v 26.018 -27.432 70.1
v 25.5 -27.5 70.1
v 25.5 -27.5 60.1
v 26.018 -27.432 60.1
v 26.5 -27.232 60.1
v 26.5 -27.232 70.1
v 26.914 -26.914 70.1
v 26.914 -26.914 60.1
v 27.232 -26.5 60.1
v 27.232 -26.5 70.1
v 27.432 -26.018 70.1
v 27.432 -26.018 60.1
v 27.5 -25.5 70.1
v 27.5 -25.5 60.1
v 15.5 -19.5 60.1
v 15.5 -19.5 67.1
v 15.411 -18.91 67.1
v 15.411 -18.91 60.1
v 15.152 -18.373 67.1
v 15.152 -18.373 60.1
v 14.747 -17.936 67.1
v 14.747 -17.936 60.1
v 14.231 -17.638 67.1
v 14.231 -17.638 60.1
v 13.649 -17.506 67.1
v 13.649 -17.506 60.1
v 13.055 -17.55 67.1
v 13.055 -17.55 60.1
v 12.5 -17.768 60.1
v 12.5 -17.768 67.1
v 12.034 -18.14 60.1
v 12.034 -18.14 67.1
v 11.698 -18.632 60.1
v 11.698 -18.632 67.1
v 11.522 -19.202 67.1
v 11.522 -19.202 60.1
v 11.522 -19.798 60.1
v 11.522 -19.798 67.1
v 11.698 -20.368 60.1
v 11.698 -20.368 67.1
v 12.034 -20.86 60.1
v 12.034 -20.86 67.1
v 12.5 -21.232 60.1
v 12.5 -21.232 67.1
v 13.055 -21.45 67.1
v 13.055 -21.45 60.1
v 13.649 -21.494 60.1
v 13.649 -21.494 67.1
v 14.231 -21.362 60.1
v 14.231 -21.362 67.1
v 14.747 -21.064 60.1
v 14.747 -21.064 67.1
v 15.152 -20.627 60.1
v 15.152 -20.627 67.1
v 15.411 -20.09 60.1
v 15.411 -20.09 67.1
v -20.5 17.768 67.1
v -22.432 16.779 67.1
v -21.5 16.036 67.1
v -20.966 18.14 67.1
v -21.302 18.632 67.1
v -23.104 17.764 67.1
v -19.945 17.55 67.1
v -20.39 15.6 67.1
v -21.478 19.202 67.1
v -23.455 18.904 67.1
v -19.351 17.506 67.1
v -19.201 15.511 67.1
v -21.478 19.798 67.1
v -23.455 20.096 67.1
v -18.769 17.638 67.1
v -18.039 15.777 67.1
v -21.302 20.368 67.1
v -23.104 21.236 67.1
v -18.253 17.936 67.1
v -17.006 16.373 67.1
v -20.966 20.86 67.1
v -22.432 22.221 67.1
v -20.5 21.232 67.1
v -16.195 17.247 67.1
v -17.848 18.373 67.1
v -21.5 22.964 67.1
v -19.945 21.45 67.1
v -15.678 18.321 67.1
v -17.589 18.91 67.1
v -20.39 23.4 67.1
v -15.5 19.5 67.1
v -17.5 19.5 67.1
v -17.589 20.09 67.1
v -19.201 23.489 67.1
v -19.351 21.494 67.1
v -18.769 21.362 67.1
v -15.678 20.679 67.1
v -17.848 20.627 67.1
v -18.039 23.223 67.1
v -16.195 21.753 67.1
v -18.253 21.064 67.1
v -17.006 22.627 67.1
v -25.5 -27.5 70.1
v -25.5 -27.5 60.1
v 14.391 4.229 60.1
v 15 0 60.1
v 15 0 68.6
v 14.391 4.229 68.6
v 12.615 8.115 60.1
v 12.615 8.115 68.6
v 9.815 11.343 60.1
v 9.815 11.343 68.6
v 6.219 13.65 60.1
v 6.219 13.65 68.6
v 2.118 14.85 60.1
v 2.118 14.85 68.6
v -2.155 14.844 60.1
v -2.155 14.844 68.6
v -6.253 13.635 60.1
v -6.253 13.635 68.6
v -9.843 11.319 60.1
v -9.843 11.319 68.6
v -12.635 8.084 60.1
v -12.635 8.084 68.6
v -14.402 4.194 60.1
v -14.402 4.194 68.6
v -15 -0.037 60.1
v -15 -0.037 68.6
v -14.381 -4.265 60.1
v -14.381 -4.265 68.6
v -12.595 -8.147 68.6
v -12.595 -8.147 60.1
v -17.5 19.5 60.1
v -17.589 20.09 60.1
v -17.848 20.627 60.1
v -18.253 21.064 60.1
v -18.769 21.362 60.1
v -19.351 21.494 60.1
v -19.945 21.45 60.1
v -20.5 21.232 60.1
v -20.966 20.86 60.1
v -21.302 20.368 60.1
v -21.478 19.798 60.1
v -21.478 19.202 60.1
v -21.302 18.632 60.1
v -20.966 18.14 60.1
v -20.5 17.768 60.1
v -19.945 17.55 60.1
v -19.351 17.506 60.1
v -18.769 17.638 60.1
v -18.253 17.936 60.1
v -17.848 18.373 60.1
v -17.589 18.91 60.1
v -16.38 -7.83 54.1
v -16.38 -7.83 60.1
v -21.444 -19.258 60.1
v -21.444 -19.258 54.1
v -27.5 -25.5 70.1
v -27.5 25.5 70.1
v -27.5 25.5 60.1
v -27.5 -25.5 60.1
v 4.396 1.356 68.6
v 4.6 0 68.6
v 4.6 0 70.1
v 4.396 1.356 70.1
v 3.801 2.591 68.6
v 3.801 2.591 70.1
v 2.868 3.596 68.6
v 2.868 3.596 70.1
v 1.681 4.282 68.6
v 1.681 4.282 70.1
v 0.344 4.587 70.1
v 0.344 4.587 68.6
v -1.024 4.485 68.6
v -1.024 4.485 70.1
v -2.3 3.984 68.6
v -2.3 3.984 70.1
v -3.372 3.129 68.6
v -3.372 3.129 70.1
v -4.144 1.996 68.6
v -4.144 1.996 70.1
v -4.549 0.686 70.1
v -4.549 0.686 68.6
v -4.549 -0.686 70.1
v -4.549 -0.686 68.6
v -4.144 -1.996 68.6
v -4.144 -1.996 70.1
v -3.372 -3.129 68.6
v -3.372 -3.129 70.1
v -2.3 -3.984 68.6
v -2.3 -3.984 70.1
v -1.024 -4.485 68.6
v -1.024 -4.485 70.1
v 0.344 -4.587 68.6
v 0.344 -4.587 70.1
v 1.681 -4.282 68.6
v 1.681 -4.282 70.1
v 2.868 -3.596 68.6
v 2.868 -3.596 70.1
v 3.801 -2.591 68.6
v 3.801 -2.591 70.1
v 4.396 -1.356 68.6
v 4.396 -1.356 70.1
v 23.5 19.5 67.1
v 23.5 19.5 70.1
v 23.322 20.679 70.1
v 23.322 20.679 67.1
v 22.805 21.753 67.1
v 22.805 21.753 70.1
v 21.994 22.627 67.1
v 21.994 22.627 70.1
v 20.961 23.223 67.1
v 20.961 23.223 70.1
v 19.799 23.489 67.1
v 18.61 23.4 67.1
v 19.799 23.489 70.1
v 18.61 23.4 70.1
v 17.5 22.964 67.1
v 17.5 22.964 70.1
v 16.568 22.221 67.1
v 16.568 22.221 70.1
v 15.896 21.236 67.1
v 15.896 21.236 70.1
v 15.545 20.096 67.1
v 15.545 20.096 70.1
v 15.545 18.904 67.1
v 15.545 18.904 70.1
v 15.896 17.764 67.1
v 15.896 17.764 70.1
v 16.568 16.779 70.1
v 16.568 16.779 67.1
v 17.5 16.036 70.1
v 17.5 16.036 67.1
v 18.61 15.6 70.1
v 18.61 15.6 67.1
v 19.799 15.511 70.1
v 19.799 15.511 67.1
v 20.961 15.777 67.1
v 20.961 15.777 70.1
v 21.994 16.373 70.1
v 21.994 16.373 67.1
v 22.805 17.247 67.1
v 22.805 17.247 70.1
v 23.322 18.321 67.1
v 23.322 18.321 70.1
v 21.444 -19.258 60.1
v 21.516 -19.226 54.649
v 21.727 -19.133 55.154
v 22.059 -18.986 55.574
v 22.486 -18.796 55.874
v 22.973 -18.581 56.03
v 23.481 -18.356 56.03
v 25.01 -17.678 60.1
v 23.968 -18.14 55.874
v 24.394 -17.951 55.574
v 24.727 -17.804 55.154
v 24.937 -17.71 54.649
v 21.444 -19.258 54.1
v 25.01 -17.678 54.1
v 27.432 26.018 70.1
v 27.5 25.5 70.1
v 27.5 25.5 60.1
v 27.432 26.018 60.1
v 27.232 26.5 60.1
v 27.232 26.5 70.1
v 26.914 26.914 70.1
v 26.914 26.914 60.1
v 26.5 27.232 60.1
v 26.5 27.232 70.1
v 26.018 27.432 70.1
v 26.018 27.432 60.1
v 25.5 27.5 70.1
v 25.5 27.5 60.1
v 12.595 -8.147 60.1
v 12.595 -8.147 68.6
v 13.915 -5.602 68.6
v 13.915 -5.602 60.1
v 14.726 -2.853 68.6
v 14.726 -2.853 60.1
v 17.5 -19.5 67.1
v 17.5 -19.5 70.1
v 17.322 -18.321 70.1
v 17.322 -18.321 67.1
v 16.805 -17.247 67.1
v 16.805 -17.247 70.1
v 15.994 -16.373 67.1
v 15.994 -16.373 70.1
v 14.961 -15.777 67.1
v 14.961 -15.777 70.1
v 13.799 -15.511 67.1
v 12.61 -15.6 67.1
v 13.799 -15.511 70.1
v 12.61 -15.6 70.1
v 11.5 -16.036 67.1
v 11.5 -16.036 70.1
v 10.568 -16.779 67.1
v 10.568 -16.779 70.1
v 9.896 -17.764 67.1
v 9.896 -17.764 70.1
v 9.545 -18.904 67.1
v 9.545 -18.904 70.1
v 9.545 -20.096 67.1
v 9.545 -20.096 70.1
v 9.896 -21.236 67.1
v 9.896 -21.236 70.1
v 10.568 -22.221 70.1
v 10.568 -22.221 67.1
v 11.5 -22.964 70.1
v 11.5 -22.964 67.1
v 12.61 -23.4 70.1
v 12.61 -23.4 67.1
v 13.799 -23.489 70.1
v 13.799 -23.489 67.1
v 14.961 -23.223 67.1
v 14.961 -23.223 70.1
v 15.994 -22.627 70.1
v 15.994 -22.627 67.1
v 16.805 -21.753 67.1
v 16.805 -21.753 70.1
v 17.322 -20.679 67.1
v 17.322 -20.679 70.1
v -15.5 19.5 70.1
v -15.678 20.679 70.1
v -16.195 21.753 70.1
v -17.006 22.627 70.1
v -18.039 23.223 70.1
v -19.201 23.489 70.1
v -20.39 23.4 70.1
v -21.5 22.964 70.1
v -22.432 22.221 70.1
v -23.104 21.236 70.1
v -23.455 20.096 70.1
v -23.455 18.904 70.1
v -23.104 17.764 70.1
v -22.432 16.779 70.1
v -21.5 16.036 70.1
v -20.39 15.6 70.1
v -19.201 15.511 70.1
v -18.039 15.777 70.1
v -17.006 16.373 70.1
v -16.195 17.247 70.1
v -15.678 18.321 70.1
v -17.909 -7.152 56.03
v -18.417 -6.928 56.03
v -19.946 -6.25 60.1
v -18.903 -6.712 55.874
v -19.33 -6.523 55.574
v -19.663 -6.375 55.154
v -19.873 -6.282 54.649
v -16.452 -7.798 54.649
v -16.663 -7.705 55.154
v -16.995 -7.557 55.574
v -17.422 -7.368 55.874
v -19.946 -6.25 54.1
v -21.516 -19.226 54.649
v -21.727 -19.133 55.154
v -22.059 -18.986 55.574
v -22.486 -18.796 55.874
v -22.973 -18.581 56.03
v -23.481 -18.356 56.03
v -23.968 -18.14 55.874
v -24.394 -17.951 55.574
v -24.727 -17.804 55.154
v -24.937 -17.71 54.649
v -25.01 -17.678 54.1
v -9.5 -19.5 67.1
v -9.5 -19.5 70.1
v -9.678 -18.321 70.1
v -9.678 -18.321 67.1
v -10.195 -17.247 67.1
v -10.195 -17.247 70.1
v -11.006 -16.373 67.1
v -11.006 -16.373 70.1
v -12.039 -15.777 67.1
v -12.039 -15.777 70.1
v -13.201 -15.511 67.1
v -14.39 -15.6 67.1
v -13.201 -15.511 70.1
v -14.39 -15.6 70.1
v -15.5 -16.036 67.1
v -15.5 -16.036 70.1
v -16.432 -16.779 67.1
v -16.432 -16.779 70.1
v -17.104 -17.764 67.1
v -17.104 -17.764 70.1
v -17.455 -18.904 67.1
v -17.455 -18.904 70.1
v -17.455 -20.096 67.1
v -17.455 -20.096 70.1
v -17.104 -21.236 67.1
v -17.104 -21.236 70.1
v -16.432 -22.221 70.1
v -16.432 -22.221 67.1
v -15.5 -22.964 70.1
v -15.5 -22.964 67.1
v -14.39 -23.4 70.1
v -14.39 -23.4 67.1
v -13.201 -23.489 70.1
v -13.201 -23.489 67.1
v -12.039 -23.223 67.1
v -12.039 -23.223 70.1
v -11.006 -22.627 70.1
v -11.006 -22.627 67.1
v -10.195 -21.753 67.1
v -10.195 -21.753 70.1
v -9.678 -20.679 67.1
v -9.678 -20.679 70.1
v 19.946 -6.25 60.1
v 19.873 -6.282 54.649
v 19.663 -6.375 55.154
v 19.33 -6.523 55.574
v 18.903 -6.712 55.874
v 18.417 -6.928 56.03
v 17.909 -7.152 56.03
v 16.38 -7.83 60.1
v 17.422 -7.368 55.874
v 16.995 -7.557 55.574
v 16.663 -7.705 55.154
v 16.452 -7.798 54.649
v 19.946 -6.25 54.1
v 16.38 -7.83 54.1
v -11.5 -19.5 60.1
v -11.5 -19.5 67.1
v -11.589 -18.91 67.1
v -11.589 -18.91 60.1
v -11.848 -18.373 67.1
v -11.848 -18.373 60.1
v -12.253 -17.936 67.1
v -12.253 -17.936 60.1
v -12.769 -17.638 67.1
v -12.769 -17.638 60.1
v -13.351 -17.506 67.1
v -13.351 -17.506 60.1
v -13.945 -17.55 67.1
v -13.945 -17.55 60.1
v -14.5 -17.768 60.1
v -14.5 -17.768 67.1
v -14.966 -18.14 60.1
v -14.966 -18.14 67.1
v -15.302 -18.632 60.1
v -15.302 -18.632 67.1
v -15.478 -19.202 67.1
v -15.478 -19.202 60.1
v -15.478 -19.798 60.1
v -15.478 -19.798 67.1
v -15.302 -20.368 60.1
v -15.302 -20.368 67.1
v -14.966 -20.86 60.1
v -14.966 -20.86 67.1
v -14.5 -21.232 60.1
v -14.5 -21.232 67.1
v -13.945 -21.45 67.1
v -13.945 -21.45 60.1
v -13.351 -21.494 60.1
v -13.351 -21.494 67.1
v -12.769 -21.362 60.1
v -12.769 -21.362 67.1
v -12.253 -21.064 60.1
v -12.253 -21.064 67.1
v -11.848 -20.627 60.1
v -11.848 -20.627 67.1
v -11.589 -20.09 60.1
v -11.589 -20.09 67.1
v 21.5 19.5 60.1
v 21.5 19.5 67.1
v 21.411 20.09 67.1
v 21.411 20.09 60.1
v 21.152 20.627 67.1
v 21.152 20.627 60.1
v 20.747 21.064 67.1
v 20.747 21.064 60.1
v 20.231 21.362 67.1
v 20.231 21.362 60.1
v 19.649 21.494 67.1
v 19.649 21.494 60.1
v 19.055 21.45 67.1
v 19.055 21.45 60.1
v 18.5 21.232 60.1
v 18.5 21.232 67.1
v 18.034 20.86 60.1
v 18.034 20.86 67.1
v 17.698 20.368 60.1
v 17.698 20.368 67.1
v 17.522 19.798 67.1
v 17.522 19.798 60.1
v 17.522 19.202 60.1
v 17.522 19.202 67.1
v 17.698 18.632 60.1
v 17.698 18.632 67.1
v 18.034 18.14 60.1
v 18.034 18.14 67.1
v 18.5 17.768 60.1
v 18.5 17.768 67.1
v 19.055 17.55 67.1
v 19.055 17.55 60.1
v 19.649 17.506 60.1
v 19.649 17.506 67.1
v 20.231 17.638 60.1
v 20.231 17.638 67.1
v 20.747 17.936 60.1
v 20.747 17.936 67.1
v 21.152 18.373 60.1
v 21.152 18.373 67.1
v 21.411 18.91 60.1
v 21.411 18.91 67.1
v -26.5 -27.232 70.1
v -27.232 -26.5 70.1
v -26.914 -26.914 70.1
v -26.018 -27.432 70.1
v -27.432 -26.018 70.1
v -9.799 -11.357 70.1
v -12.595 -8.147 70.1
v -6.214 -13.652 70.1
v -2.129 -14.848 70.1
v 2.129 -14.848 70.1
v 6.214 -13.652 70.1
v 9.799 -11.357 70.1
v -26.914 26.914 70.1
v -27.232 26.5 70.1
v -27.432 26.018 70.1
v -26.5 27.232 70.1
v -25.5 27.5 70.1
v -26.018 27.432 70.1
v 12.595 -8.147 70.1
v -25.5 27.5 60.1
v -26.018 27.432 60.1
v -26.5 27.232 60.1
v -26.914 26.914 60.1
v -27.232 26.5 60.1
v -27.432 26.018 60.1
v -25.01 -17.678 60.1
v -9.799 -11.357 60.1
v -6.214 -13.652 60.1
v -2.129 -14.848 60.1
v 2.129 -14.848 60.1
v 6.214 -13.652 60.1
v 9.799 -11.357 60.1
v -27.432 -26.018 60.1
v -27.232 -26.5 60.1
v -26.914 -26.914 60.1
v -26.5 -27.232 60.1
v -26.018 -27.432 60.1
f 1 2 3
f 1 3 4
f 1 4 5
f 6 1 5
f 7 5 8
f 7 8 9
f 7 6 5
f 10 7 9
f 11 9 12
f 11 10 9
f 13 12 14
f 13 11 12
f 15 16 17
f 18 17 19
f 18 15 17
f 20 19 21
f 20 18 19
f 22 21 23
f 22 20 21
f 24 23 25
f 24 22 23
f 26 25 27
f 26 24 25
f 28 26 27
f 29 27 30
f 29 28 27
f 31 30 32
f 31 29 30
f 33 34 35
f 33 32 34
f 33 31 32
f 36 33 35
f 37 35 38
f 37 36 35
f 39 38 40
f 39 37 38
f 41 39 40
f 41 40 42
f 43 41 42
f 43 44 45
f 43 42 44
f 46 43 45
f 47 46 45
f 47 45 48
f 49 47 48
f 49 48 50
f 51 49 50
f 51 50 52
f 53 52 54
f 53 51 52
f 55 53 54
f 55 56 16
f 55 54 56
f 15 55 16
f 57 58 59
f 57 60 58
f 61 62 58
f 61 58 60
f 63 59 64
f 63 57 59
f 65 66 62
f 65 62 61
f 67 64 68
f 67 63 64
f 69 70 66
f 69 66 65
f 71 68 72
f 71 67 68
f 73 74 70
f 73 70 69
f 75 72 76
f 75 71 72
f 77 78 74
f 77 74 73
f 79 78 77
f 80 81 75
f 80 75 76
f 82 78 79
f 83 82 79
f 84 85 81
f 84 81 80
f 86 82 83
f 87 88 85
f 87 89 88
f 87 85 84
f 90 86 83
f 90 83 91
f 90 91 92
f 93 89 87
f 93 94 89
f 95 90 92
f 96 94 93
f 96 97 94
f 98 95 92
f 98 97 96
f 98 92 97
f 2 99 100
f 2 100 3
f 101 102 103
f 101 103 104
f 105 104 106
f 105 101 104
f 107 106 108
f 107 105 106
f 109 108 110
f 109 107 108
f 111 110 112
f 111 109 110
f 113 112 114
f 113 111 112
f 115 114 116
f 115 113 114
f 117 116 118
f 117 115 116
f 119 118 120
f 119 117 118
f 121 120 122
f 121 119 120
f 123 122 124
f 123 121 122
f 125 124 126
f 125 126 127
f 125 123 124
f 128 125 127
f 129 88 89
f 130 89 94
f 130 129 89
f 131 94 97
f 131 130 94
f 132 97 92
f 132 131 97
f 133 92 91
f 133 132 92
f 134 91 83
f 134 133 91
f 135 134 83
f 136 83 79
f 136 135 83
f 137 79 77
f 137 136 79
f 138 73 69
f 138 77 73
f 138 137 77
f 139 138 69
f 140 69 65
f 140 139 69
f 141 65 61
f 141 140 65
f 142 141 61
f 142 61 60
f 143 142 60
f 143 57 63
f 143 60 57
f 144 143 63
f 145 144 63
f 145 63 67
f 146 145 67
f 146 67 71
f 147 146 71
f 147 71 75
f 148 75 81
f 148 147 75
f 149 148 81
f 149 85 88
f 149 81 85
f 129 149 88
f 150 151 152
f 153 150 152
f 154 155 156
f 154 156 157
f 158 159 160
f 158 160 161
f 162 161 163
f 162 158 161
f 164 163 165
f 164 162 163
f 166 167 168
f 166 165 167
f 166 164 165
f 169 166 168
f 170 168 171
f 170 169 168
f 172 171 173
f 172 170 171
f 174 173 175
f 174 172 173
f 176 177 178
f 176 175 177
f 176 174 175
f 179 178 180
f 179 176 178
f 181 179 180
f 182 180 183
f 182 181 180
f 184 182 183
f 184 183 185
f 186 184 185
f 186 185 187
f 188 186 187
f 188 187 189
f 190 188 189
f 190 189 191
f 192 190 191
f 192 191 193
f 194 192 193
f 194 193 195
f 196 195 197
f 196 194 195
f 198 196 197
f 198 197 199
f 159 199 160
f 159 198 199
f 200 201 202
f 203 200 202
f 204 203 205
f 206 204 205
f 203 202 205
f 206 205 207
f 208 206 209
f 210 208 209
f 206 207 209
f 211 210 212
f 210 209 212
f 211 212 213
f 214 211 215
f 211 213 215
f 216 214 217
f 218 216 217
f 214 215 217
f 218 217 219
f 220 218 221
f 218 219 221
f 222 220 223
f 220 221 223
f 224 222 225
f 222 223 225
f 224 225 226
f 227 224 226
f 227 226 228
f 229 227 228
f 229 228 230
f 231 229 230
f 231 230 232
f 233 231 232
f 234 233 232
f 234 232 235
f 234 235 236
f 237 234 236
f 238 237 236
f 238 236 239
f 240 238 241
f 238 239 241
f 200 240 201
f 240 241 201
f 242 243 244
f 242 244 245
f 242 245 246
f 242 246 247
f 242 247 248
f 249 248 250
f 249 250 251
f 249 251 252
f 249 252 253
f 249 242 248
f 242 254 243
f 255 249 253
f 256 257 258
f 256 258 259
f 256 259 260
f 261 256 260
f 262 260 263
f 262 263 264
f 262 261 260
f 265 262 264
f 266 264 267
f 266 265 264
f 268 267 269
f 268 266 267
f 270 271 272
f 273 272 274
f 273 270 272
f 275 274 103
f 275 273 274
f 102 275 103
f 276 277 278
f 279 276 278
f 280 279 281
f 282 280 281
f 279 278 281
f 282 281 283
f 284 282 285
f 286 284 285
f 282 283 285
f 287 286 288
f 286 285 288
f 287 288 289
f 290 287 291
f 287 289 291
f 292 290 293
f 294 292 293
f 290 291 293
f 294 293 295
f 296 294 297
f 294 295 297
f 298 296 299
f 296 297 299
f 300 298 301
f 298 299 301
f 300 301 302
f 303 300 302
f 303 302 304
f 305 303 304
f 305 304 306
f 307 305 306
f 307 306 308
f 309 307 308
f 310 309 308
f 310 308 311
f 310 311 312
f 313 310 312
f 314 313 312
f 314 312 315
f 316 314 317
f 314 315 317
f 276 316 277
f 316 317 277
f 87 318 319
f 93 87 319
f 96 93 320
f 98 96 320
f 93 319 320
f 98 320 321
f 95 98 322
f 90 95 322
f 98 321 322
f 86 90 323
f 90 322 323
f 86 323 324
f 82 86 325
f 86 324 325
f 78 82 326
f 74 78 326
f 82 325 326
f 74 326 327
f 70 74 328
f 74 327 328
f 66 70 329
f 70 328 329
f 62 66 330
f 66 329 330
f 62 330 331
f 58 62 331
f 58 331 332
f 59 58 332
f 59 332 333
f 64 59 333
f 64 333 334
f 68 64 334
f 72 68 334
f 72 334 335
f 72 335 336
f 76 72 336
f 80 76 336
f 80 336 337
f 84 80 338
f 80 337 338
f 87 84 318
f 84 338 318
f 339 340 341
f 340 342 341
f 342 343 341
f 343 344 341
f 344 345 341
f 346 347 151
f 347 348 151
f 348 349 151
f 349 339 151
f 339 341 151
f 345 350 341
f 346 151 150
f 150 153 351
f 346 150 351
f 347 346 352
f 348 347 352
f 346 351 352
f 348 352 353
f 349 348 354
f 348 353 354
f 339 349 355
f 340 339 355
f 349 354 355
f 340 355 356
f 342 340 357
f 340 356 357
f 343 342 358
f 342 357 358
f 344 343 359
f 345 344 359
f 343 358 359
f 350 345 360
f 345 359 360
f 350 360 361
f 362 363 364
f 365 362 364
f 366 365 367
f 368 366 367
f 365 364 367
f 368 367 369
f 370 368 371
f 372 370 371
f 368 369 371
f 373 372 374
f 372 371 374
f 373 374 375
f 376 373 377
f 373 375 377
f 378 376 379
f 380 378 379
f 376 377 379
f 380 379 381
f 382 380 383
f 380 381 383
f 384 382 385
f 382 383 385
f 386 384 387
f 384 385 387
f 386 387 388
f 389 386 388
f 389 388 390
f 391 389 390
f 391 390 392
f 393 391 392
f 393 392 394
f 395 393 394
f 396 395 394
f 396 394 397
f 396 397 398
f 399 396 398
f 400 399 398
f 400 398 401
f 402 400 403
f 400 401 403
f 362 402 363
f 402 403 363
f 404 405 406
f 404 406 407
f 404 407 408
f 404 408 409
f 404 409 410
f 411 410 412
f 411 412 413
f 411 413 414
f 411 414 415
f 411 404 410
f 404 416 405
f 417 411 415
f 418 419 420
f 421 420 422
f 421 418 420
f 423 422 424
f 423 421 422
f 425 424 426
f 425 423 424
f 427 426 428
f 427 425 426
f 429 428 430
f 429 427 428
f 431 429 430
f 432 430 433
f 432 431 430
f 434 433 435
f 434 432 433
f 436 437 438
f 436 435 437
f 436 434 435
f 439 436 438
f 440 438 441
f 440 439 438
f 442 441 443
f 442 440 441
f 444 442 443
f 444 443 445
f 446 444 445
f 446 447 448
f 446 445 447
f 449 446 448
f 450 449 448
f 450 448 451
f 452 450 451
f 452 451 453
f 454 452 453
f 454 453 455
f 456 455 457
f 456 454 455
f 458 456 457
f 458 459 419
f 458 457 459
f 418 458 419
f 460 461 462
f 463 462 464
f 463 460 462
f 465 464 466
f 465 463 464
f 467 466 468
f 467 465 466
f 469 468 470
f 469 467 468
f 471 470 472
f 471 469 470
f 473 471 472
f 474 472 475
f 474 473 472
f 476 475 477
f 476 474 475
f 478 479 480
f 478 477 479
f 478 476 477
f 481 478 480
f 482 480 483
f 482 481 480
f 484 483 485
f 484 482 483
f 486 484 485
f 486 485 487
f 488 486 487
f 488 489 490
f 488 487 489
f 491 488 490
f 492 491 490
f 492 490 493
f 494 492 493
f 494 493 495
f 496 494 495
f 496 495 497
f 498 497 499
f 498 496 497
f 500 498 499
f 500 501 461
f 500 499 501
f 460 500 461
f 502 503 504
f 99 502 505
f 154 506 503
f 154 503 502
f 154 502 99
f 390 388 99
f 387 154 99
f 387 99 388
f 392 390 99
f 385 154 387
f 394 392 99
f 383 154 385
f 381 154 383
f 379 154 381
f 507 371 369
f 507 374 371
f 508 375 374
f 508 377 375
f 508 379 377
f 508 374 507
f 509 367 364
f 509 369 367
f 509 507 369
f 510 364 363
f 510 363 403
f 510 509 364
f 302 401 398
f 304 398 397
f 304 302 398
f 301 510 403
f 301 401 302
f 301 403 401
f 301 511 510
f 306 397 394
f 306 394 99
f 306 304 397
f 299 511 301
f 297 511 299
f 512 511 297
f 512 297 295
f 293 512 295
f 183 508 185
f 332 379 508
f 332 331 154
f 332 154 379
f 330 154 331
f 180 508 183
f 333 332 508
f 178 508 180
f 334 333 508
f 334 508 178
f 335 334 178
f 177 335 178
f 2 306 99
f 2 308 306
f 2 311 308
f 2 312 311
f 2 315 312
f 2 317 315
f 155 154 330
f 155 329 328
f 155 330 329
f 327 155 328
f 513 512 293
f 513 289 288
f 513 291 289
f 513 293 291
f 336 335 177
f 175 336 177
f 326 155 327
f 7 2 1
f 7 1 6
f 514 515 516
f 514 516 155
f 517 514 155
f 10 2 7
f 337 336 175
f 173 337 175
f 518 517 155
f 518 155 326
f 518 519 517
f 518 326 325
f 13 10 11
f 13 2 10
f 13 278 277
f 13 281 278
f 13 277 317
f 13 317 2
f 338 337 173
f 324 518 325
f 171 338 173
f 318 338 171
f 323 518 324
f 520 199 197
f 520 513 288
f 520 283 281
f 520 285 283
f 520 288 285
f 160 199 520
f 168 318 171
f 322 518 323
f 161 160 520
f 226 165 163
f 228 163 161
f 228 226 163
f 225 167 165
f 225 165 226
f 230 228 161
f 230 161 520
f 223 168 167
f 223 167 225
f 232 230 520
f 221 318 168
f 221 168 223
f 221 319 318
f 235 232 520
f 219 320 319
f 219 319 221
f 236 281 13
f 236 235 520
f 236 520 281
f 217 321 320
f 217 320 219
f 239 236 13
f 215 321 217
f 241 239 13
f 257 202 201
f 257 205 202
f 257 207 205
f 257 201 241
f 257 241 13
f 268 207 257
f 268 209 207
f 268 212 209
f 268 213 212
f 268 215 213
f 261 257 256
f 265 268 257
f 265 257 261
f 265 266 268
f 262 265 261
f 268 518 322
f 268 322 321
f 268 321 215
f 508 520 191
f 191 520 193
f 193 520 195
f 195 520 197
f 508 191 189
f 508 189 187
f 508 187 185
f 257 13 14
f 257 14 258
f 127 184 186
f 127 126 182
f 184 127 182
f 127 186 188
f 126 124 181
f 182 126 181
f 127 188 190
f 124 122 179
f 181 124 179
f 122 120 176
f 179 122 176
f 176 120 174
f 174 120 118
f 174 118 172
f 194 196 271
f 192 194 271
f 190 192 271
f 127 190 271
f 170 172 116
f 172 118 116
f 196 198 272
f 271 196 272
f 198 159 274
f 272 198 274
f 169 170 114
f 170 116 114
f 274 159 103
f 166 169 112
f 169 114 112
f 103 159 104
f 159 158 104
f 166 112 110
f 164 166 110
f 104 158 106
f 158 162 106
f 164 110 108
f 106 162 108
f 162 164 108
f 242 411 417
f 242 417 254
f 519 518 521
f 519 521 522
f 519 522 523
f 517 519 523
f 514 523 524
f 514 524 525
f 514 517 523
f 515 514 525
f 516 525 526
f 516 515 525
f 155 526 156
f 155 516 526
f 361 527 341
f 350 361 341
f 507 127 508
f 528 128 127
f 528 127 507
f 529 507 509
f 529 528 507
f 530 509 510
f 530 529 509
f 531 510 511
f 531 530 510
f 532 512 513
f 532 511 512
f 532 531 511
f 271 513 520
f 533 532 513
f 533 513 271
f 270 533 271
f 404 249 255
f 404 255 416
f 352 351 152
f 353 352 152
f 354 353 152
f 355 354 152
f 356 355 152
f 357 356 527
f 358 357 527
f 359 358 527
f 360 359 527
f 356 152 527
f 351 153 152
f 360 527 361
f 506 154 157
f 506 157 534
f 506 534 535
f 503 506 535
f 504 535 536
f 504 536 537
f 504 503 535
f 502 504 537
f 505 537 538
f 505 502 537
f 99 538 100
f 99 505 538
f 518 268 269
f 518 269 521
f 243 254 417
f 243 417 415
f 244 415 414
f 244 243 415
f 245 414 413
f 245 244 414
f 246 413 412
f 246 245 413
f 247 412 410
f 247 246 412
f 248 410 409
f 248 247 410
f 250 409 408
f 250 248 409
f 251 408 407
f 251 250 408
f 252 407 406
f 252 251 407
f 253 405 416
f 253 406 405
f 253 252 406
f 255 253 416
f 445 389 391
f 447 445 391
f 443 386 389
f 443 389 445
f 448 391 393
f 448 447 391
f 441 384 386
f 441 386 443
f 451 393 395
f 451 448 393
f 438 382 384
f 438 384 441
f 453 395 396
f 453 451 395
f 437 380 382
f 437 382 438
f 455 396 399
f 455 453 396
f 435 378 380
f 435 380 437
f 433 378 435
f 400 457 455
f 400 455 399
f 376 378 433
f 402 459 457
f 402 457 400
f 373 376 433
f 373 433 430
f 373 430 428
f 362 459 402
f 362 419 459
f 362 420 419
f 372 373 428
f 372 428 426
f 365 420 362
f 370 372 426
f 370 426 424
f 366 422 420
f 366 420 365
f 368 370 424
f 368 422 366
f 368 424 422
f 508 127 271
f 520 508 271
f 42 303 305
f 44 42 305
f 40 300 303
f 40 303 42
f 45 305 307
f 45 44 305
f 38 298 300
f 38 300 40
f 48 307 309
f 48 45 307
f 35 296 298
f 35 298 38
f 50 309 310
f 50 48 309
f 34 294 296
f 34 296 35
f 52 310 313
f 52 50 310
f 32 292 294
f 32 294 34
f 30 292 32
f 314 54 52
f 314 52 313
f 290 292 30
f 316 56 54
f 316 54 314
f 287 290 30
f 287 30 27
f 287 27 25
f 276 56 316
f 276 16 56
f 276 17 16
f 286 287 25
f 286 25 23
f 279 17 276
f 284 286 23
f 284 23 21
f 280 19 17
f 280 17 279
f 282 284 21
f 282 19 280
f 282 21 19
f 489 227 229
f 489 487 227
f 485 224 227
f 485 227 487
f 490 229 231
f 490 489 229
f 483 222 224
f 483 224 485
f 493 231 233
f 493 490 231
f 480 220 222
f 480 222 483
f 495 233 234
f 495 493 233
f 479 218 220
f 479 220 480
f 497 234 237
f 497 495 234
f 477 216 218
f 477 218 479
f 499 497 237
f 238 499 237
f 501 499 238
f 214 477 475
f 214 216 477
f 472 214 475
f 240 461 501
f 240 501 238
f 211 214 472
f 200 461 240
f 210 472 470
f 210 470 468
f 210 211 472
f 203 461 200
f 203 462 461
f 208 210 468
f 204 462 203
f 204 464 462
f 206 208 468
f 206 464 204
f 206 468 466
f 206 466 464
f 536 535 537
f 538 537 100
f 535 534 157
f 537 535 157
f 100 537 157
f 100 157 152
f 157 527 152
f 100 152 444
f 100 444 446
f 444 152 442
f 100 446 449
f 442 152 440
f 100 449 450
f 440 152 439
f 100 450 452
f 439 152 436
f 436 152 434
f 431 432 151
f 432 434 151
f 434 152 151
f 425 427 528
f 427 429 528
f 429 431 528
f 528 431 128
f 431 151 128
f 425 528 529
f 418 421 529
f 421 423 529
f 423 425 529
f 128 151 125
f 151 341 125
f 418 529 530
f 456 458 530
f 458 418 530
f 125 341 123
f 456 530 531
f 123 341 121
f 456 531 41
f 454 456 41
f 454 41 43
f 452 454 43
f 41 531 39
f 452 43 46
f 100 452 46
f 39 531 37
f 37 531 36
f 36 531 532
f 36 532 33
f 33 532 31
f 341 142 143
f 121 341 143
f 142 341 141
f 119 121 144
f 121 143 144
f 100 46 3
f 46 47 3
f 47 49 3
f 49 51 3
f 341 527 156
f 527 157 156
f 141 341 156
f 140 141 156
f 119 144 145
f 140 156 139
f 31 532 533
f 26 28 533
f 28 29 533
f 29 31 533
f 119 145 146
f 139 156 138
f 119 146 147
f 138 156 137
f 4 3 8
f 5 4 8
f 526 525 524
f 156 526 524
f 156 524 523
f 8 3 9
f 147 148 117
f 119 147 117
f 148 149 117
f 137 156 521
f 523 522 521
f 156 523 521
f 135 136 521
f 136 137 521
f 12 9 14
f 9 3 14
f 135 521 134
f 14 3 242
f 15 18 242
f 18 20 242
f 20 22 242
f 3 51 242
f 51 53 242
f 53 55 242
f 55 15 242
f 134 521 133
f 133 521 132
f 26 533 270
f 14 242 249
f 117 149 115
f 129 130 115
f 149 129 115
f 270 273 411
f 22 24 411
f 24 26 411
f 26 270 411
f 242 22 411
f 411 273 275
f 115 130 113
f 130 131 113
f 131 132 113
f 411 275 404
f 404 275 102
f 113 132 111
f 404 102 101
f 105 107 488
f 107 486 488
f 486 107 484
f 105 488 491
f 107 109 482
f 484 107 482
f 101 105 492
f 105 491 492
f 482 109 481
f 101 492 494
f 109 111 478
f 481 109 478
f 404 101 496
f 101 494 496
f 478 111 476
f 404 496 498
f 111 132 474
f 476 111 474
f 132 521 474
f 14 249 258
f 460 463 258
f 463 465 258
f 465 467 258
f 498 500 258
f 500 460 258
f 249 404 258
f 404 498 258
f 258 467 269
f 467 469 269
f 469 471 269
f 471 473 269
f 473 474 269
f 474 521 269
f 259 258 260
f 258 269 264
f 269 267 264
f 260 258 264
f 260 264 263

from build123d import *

# Parameters (mm, degrees)
PAD011_DEPTH    = 10
PAD012_DEPTH    = 6
POCKET014_DEPTH = 221.3994809485
SKETCH029_R     = 2
SKETCH029_R_2   = 4.6
POCKET015_DEPTH = 10.001
SKETCH030_R     = 4
POCKET016_DEPTH = 3
SKETCH031_R     = 15
POCKET017_DEPTH = 8.5


with BuildPart() as part:
    # Sketch025 → Pad011 (new body)
    with BuildSketch(Plane.XY.offset(70.1)):
        with BuildLine():
            Line((-27.5, 25.5), (-27.5, -25.5))
            ThreePointArc((-27.5, -25.5), (-26.9142135624, -26.9142135624), (-25.5, -27.5))
            Line((-25.5, -27.5), (25.5, -27.5))
            ThreePointArc((25.5, -27.5), (26.9142135624, -26.9142135624), (27.5, -25.5))
            Line((27.5, -25.5), (27.5, 25.5))
            ThreePointArc((27.5, 25.5), (26.9142135624, 26.9142135624), (25.5, 27.5))
            Line((25.5, 27.5), (-25.5, 27.5))
            ThreePointArc((-25.5, 27.5), (-26.9142135624, 26.9142135624), (-27.5, 25.5))
        make_face()
    extrude(amount=-PAD011_DEPTH)

    # Sketch027 → Pad012 (join)
    with BuildSketch(Plane.XY.offset(60.1)):
        Polygon((-19.9456135517, -6.25), (-16.38, -7.83), (-21.4441025641, -19.2582485631), (-25.0097161158, -17.6782485631), align=None)
    pad012 = extrude(amount=-PAD012_DEPTH)

    # Sketch028 (on Face12 of Pad012) → Pocket014 (cut, through all)
    with BuildSketch(Plane(origin=(-10.6527063441, -24.0401481662, 0), x_dir=(0.914259885, -0.4051282051, 0), z_dir=(-0.4051282051, -0.914259885, 0))):
        with BuildLine():
            ThreePointArc((-11.8034230709, 54.1), (-13.7534230709, 56.05), (-15.7034230709, 54.1))
            Line((-11.8034230709, 54.1), (-15.7034230709, 54.1))
        make_face()
    pocket014 = extrude(amount=-POCKET014_DEPTH, mode=Mode.SUBTRACT)

    # Mirrored001: Pad012, Pocket014 across YZ
    add(pad012.mirror(Plane.YZ))
    add(pocket014.mirror(Plane.YZ), mode=Mode.SUBTRACT)

    # Sketch029 → Pocket015 (cut, through all)
    with BuildSketch(Plane.XY.offset(60.1)):
        with Locations((19.5, 19.5)):
            Circle(SKETCH029_R)
        with Locations((-19.5, 19.5)):
            Circle(SKETCH029_R)
        with Locations((-13.5, -19.5)):
            Circle(SKETCH029_R)
        with Locations((13.5, -19.5)):
            Circle(SKETCH029_R)
        Circle(SKETCH029_R_2)
        with BuildLine():
            ThreePointArc((-12.595, -8.1465314705), (0, -15), (12.595, -8.1465314705))
            Line((-12.595, -8.1465314705), (12.595, -8.1465314705))
        make_face()
    extrude(amount=POCKET015_DEPTH, mode=Mode.SUBTRACT)

    # Sketch030 → Pocket016 (cut)
    with BuildSketch(Plane.XY.offset(70.1)):
        with Locations((13.5, -19.5)):
            Circle(SKETCH030_R)
        with Locations((-13.5, -19.5)):
            Circle(SKETCH030_R)
        with Locations((-19.5, 19.5)):
            Circle(SKETCH030_R)
        with Locations((19.5, 19.5)):
            Circle(SKETCH030_R)
    extrude(amount=-POCKET016_DEPTH, mode=Mode.SUBTRACT)

    # Sketch031 → Pocket017 (cut)
    with BuildSketch(Plane.XY.offset(60.1)):
        Circle(SKETCH031_R)
    extrude(amount=POCKET017_DEPTH, mode=Mode.SUBTRACT)


solid = part.part
